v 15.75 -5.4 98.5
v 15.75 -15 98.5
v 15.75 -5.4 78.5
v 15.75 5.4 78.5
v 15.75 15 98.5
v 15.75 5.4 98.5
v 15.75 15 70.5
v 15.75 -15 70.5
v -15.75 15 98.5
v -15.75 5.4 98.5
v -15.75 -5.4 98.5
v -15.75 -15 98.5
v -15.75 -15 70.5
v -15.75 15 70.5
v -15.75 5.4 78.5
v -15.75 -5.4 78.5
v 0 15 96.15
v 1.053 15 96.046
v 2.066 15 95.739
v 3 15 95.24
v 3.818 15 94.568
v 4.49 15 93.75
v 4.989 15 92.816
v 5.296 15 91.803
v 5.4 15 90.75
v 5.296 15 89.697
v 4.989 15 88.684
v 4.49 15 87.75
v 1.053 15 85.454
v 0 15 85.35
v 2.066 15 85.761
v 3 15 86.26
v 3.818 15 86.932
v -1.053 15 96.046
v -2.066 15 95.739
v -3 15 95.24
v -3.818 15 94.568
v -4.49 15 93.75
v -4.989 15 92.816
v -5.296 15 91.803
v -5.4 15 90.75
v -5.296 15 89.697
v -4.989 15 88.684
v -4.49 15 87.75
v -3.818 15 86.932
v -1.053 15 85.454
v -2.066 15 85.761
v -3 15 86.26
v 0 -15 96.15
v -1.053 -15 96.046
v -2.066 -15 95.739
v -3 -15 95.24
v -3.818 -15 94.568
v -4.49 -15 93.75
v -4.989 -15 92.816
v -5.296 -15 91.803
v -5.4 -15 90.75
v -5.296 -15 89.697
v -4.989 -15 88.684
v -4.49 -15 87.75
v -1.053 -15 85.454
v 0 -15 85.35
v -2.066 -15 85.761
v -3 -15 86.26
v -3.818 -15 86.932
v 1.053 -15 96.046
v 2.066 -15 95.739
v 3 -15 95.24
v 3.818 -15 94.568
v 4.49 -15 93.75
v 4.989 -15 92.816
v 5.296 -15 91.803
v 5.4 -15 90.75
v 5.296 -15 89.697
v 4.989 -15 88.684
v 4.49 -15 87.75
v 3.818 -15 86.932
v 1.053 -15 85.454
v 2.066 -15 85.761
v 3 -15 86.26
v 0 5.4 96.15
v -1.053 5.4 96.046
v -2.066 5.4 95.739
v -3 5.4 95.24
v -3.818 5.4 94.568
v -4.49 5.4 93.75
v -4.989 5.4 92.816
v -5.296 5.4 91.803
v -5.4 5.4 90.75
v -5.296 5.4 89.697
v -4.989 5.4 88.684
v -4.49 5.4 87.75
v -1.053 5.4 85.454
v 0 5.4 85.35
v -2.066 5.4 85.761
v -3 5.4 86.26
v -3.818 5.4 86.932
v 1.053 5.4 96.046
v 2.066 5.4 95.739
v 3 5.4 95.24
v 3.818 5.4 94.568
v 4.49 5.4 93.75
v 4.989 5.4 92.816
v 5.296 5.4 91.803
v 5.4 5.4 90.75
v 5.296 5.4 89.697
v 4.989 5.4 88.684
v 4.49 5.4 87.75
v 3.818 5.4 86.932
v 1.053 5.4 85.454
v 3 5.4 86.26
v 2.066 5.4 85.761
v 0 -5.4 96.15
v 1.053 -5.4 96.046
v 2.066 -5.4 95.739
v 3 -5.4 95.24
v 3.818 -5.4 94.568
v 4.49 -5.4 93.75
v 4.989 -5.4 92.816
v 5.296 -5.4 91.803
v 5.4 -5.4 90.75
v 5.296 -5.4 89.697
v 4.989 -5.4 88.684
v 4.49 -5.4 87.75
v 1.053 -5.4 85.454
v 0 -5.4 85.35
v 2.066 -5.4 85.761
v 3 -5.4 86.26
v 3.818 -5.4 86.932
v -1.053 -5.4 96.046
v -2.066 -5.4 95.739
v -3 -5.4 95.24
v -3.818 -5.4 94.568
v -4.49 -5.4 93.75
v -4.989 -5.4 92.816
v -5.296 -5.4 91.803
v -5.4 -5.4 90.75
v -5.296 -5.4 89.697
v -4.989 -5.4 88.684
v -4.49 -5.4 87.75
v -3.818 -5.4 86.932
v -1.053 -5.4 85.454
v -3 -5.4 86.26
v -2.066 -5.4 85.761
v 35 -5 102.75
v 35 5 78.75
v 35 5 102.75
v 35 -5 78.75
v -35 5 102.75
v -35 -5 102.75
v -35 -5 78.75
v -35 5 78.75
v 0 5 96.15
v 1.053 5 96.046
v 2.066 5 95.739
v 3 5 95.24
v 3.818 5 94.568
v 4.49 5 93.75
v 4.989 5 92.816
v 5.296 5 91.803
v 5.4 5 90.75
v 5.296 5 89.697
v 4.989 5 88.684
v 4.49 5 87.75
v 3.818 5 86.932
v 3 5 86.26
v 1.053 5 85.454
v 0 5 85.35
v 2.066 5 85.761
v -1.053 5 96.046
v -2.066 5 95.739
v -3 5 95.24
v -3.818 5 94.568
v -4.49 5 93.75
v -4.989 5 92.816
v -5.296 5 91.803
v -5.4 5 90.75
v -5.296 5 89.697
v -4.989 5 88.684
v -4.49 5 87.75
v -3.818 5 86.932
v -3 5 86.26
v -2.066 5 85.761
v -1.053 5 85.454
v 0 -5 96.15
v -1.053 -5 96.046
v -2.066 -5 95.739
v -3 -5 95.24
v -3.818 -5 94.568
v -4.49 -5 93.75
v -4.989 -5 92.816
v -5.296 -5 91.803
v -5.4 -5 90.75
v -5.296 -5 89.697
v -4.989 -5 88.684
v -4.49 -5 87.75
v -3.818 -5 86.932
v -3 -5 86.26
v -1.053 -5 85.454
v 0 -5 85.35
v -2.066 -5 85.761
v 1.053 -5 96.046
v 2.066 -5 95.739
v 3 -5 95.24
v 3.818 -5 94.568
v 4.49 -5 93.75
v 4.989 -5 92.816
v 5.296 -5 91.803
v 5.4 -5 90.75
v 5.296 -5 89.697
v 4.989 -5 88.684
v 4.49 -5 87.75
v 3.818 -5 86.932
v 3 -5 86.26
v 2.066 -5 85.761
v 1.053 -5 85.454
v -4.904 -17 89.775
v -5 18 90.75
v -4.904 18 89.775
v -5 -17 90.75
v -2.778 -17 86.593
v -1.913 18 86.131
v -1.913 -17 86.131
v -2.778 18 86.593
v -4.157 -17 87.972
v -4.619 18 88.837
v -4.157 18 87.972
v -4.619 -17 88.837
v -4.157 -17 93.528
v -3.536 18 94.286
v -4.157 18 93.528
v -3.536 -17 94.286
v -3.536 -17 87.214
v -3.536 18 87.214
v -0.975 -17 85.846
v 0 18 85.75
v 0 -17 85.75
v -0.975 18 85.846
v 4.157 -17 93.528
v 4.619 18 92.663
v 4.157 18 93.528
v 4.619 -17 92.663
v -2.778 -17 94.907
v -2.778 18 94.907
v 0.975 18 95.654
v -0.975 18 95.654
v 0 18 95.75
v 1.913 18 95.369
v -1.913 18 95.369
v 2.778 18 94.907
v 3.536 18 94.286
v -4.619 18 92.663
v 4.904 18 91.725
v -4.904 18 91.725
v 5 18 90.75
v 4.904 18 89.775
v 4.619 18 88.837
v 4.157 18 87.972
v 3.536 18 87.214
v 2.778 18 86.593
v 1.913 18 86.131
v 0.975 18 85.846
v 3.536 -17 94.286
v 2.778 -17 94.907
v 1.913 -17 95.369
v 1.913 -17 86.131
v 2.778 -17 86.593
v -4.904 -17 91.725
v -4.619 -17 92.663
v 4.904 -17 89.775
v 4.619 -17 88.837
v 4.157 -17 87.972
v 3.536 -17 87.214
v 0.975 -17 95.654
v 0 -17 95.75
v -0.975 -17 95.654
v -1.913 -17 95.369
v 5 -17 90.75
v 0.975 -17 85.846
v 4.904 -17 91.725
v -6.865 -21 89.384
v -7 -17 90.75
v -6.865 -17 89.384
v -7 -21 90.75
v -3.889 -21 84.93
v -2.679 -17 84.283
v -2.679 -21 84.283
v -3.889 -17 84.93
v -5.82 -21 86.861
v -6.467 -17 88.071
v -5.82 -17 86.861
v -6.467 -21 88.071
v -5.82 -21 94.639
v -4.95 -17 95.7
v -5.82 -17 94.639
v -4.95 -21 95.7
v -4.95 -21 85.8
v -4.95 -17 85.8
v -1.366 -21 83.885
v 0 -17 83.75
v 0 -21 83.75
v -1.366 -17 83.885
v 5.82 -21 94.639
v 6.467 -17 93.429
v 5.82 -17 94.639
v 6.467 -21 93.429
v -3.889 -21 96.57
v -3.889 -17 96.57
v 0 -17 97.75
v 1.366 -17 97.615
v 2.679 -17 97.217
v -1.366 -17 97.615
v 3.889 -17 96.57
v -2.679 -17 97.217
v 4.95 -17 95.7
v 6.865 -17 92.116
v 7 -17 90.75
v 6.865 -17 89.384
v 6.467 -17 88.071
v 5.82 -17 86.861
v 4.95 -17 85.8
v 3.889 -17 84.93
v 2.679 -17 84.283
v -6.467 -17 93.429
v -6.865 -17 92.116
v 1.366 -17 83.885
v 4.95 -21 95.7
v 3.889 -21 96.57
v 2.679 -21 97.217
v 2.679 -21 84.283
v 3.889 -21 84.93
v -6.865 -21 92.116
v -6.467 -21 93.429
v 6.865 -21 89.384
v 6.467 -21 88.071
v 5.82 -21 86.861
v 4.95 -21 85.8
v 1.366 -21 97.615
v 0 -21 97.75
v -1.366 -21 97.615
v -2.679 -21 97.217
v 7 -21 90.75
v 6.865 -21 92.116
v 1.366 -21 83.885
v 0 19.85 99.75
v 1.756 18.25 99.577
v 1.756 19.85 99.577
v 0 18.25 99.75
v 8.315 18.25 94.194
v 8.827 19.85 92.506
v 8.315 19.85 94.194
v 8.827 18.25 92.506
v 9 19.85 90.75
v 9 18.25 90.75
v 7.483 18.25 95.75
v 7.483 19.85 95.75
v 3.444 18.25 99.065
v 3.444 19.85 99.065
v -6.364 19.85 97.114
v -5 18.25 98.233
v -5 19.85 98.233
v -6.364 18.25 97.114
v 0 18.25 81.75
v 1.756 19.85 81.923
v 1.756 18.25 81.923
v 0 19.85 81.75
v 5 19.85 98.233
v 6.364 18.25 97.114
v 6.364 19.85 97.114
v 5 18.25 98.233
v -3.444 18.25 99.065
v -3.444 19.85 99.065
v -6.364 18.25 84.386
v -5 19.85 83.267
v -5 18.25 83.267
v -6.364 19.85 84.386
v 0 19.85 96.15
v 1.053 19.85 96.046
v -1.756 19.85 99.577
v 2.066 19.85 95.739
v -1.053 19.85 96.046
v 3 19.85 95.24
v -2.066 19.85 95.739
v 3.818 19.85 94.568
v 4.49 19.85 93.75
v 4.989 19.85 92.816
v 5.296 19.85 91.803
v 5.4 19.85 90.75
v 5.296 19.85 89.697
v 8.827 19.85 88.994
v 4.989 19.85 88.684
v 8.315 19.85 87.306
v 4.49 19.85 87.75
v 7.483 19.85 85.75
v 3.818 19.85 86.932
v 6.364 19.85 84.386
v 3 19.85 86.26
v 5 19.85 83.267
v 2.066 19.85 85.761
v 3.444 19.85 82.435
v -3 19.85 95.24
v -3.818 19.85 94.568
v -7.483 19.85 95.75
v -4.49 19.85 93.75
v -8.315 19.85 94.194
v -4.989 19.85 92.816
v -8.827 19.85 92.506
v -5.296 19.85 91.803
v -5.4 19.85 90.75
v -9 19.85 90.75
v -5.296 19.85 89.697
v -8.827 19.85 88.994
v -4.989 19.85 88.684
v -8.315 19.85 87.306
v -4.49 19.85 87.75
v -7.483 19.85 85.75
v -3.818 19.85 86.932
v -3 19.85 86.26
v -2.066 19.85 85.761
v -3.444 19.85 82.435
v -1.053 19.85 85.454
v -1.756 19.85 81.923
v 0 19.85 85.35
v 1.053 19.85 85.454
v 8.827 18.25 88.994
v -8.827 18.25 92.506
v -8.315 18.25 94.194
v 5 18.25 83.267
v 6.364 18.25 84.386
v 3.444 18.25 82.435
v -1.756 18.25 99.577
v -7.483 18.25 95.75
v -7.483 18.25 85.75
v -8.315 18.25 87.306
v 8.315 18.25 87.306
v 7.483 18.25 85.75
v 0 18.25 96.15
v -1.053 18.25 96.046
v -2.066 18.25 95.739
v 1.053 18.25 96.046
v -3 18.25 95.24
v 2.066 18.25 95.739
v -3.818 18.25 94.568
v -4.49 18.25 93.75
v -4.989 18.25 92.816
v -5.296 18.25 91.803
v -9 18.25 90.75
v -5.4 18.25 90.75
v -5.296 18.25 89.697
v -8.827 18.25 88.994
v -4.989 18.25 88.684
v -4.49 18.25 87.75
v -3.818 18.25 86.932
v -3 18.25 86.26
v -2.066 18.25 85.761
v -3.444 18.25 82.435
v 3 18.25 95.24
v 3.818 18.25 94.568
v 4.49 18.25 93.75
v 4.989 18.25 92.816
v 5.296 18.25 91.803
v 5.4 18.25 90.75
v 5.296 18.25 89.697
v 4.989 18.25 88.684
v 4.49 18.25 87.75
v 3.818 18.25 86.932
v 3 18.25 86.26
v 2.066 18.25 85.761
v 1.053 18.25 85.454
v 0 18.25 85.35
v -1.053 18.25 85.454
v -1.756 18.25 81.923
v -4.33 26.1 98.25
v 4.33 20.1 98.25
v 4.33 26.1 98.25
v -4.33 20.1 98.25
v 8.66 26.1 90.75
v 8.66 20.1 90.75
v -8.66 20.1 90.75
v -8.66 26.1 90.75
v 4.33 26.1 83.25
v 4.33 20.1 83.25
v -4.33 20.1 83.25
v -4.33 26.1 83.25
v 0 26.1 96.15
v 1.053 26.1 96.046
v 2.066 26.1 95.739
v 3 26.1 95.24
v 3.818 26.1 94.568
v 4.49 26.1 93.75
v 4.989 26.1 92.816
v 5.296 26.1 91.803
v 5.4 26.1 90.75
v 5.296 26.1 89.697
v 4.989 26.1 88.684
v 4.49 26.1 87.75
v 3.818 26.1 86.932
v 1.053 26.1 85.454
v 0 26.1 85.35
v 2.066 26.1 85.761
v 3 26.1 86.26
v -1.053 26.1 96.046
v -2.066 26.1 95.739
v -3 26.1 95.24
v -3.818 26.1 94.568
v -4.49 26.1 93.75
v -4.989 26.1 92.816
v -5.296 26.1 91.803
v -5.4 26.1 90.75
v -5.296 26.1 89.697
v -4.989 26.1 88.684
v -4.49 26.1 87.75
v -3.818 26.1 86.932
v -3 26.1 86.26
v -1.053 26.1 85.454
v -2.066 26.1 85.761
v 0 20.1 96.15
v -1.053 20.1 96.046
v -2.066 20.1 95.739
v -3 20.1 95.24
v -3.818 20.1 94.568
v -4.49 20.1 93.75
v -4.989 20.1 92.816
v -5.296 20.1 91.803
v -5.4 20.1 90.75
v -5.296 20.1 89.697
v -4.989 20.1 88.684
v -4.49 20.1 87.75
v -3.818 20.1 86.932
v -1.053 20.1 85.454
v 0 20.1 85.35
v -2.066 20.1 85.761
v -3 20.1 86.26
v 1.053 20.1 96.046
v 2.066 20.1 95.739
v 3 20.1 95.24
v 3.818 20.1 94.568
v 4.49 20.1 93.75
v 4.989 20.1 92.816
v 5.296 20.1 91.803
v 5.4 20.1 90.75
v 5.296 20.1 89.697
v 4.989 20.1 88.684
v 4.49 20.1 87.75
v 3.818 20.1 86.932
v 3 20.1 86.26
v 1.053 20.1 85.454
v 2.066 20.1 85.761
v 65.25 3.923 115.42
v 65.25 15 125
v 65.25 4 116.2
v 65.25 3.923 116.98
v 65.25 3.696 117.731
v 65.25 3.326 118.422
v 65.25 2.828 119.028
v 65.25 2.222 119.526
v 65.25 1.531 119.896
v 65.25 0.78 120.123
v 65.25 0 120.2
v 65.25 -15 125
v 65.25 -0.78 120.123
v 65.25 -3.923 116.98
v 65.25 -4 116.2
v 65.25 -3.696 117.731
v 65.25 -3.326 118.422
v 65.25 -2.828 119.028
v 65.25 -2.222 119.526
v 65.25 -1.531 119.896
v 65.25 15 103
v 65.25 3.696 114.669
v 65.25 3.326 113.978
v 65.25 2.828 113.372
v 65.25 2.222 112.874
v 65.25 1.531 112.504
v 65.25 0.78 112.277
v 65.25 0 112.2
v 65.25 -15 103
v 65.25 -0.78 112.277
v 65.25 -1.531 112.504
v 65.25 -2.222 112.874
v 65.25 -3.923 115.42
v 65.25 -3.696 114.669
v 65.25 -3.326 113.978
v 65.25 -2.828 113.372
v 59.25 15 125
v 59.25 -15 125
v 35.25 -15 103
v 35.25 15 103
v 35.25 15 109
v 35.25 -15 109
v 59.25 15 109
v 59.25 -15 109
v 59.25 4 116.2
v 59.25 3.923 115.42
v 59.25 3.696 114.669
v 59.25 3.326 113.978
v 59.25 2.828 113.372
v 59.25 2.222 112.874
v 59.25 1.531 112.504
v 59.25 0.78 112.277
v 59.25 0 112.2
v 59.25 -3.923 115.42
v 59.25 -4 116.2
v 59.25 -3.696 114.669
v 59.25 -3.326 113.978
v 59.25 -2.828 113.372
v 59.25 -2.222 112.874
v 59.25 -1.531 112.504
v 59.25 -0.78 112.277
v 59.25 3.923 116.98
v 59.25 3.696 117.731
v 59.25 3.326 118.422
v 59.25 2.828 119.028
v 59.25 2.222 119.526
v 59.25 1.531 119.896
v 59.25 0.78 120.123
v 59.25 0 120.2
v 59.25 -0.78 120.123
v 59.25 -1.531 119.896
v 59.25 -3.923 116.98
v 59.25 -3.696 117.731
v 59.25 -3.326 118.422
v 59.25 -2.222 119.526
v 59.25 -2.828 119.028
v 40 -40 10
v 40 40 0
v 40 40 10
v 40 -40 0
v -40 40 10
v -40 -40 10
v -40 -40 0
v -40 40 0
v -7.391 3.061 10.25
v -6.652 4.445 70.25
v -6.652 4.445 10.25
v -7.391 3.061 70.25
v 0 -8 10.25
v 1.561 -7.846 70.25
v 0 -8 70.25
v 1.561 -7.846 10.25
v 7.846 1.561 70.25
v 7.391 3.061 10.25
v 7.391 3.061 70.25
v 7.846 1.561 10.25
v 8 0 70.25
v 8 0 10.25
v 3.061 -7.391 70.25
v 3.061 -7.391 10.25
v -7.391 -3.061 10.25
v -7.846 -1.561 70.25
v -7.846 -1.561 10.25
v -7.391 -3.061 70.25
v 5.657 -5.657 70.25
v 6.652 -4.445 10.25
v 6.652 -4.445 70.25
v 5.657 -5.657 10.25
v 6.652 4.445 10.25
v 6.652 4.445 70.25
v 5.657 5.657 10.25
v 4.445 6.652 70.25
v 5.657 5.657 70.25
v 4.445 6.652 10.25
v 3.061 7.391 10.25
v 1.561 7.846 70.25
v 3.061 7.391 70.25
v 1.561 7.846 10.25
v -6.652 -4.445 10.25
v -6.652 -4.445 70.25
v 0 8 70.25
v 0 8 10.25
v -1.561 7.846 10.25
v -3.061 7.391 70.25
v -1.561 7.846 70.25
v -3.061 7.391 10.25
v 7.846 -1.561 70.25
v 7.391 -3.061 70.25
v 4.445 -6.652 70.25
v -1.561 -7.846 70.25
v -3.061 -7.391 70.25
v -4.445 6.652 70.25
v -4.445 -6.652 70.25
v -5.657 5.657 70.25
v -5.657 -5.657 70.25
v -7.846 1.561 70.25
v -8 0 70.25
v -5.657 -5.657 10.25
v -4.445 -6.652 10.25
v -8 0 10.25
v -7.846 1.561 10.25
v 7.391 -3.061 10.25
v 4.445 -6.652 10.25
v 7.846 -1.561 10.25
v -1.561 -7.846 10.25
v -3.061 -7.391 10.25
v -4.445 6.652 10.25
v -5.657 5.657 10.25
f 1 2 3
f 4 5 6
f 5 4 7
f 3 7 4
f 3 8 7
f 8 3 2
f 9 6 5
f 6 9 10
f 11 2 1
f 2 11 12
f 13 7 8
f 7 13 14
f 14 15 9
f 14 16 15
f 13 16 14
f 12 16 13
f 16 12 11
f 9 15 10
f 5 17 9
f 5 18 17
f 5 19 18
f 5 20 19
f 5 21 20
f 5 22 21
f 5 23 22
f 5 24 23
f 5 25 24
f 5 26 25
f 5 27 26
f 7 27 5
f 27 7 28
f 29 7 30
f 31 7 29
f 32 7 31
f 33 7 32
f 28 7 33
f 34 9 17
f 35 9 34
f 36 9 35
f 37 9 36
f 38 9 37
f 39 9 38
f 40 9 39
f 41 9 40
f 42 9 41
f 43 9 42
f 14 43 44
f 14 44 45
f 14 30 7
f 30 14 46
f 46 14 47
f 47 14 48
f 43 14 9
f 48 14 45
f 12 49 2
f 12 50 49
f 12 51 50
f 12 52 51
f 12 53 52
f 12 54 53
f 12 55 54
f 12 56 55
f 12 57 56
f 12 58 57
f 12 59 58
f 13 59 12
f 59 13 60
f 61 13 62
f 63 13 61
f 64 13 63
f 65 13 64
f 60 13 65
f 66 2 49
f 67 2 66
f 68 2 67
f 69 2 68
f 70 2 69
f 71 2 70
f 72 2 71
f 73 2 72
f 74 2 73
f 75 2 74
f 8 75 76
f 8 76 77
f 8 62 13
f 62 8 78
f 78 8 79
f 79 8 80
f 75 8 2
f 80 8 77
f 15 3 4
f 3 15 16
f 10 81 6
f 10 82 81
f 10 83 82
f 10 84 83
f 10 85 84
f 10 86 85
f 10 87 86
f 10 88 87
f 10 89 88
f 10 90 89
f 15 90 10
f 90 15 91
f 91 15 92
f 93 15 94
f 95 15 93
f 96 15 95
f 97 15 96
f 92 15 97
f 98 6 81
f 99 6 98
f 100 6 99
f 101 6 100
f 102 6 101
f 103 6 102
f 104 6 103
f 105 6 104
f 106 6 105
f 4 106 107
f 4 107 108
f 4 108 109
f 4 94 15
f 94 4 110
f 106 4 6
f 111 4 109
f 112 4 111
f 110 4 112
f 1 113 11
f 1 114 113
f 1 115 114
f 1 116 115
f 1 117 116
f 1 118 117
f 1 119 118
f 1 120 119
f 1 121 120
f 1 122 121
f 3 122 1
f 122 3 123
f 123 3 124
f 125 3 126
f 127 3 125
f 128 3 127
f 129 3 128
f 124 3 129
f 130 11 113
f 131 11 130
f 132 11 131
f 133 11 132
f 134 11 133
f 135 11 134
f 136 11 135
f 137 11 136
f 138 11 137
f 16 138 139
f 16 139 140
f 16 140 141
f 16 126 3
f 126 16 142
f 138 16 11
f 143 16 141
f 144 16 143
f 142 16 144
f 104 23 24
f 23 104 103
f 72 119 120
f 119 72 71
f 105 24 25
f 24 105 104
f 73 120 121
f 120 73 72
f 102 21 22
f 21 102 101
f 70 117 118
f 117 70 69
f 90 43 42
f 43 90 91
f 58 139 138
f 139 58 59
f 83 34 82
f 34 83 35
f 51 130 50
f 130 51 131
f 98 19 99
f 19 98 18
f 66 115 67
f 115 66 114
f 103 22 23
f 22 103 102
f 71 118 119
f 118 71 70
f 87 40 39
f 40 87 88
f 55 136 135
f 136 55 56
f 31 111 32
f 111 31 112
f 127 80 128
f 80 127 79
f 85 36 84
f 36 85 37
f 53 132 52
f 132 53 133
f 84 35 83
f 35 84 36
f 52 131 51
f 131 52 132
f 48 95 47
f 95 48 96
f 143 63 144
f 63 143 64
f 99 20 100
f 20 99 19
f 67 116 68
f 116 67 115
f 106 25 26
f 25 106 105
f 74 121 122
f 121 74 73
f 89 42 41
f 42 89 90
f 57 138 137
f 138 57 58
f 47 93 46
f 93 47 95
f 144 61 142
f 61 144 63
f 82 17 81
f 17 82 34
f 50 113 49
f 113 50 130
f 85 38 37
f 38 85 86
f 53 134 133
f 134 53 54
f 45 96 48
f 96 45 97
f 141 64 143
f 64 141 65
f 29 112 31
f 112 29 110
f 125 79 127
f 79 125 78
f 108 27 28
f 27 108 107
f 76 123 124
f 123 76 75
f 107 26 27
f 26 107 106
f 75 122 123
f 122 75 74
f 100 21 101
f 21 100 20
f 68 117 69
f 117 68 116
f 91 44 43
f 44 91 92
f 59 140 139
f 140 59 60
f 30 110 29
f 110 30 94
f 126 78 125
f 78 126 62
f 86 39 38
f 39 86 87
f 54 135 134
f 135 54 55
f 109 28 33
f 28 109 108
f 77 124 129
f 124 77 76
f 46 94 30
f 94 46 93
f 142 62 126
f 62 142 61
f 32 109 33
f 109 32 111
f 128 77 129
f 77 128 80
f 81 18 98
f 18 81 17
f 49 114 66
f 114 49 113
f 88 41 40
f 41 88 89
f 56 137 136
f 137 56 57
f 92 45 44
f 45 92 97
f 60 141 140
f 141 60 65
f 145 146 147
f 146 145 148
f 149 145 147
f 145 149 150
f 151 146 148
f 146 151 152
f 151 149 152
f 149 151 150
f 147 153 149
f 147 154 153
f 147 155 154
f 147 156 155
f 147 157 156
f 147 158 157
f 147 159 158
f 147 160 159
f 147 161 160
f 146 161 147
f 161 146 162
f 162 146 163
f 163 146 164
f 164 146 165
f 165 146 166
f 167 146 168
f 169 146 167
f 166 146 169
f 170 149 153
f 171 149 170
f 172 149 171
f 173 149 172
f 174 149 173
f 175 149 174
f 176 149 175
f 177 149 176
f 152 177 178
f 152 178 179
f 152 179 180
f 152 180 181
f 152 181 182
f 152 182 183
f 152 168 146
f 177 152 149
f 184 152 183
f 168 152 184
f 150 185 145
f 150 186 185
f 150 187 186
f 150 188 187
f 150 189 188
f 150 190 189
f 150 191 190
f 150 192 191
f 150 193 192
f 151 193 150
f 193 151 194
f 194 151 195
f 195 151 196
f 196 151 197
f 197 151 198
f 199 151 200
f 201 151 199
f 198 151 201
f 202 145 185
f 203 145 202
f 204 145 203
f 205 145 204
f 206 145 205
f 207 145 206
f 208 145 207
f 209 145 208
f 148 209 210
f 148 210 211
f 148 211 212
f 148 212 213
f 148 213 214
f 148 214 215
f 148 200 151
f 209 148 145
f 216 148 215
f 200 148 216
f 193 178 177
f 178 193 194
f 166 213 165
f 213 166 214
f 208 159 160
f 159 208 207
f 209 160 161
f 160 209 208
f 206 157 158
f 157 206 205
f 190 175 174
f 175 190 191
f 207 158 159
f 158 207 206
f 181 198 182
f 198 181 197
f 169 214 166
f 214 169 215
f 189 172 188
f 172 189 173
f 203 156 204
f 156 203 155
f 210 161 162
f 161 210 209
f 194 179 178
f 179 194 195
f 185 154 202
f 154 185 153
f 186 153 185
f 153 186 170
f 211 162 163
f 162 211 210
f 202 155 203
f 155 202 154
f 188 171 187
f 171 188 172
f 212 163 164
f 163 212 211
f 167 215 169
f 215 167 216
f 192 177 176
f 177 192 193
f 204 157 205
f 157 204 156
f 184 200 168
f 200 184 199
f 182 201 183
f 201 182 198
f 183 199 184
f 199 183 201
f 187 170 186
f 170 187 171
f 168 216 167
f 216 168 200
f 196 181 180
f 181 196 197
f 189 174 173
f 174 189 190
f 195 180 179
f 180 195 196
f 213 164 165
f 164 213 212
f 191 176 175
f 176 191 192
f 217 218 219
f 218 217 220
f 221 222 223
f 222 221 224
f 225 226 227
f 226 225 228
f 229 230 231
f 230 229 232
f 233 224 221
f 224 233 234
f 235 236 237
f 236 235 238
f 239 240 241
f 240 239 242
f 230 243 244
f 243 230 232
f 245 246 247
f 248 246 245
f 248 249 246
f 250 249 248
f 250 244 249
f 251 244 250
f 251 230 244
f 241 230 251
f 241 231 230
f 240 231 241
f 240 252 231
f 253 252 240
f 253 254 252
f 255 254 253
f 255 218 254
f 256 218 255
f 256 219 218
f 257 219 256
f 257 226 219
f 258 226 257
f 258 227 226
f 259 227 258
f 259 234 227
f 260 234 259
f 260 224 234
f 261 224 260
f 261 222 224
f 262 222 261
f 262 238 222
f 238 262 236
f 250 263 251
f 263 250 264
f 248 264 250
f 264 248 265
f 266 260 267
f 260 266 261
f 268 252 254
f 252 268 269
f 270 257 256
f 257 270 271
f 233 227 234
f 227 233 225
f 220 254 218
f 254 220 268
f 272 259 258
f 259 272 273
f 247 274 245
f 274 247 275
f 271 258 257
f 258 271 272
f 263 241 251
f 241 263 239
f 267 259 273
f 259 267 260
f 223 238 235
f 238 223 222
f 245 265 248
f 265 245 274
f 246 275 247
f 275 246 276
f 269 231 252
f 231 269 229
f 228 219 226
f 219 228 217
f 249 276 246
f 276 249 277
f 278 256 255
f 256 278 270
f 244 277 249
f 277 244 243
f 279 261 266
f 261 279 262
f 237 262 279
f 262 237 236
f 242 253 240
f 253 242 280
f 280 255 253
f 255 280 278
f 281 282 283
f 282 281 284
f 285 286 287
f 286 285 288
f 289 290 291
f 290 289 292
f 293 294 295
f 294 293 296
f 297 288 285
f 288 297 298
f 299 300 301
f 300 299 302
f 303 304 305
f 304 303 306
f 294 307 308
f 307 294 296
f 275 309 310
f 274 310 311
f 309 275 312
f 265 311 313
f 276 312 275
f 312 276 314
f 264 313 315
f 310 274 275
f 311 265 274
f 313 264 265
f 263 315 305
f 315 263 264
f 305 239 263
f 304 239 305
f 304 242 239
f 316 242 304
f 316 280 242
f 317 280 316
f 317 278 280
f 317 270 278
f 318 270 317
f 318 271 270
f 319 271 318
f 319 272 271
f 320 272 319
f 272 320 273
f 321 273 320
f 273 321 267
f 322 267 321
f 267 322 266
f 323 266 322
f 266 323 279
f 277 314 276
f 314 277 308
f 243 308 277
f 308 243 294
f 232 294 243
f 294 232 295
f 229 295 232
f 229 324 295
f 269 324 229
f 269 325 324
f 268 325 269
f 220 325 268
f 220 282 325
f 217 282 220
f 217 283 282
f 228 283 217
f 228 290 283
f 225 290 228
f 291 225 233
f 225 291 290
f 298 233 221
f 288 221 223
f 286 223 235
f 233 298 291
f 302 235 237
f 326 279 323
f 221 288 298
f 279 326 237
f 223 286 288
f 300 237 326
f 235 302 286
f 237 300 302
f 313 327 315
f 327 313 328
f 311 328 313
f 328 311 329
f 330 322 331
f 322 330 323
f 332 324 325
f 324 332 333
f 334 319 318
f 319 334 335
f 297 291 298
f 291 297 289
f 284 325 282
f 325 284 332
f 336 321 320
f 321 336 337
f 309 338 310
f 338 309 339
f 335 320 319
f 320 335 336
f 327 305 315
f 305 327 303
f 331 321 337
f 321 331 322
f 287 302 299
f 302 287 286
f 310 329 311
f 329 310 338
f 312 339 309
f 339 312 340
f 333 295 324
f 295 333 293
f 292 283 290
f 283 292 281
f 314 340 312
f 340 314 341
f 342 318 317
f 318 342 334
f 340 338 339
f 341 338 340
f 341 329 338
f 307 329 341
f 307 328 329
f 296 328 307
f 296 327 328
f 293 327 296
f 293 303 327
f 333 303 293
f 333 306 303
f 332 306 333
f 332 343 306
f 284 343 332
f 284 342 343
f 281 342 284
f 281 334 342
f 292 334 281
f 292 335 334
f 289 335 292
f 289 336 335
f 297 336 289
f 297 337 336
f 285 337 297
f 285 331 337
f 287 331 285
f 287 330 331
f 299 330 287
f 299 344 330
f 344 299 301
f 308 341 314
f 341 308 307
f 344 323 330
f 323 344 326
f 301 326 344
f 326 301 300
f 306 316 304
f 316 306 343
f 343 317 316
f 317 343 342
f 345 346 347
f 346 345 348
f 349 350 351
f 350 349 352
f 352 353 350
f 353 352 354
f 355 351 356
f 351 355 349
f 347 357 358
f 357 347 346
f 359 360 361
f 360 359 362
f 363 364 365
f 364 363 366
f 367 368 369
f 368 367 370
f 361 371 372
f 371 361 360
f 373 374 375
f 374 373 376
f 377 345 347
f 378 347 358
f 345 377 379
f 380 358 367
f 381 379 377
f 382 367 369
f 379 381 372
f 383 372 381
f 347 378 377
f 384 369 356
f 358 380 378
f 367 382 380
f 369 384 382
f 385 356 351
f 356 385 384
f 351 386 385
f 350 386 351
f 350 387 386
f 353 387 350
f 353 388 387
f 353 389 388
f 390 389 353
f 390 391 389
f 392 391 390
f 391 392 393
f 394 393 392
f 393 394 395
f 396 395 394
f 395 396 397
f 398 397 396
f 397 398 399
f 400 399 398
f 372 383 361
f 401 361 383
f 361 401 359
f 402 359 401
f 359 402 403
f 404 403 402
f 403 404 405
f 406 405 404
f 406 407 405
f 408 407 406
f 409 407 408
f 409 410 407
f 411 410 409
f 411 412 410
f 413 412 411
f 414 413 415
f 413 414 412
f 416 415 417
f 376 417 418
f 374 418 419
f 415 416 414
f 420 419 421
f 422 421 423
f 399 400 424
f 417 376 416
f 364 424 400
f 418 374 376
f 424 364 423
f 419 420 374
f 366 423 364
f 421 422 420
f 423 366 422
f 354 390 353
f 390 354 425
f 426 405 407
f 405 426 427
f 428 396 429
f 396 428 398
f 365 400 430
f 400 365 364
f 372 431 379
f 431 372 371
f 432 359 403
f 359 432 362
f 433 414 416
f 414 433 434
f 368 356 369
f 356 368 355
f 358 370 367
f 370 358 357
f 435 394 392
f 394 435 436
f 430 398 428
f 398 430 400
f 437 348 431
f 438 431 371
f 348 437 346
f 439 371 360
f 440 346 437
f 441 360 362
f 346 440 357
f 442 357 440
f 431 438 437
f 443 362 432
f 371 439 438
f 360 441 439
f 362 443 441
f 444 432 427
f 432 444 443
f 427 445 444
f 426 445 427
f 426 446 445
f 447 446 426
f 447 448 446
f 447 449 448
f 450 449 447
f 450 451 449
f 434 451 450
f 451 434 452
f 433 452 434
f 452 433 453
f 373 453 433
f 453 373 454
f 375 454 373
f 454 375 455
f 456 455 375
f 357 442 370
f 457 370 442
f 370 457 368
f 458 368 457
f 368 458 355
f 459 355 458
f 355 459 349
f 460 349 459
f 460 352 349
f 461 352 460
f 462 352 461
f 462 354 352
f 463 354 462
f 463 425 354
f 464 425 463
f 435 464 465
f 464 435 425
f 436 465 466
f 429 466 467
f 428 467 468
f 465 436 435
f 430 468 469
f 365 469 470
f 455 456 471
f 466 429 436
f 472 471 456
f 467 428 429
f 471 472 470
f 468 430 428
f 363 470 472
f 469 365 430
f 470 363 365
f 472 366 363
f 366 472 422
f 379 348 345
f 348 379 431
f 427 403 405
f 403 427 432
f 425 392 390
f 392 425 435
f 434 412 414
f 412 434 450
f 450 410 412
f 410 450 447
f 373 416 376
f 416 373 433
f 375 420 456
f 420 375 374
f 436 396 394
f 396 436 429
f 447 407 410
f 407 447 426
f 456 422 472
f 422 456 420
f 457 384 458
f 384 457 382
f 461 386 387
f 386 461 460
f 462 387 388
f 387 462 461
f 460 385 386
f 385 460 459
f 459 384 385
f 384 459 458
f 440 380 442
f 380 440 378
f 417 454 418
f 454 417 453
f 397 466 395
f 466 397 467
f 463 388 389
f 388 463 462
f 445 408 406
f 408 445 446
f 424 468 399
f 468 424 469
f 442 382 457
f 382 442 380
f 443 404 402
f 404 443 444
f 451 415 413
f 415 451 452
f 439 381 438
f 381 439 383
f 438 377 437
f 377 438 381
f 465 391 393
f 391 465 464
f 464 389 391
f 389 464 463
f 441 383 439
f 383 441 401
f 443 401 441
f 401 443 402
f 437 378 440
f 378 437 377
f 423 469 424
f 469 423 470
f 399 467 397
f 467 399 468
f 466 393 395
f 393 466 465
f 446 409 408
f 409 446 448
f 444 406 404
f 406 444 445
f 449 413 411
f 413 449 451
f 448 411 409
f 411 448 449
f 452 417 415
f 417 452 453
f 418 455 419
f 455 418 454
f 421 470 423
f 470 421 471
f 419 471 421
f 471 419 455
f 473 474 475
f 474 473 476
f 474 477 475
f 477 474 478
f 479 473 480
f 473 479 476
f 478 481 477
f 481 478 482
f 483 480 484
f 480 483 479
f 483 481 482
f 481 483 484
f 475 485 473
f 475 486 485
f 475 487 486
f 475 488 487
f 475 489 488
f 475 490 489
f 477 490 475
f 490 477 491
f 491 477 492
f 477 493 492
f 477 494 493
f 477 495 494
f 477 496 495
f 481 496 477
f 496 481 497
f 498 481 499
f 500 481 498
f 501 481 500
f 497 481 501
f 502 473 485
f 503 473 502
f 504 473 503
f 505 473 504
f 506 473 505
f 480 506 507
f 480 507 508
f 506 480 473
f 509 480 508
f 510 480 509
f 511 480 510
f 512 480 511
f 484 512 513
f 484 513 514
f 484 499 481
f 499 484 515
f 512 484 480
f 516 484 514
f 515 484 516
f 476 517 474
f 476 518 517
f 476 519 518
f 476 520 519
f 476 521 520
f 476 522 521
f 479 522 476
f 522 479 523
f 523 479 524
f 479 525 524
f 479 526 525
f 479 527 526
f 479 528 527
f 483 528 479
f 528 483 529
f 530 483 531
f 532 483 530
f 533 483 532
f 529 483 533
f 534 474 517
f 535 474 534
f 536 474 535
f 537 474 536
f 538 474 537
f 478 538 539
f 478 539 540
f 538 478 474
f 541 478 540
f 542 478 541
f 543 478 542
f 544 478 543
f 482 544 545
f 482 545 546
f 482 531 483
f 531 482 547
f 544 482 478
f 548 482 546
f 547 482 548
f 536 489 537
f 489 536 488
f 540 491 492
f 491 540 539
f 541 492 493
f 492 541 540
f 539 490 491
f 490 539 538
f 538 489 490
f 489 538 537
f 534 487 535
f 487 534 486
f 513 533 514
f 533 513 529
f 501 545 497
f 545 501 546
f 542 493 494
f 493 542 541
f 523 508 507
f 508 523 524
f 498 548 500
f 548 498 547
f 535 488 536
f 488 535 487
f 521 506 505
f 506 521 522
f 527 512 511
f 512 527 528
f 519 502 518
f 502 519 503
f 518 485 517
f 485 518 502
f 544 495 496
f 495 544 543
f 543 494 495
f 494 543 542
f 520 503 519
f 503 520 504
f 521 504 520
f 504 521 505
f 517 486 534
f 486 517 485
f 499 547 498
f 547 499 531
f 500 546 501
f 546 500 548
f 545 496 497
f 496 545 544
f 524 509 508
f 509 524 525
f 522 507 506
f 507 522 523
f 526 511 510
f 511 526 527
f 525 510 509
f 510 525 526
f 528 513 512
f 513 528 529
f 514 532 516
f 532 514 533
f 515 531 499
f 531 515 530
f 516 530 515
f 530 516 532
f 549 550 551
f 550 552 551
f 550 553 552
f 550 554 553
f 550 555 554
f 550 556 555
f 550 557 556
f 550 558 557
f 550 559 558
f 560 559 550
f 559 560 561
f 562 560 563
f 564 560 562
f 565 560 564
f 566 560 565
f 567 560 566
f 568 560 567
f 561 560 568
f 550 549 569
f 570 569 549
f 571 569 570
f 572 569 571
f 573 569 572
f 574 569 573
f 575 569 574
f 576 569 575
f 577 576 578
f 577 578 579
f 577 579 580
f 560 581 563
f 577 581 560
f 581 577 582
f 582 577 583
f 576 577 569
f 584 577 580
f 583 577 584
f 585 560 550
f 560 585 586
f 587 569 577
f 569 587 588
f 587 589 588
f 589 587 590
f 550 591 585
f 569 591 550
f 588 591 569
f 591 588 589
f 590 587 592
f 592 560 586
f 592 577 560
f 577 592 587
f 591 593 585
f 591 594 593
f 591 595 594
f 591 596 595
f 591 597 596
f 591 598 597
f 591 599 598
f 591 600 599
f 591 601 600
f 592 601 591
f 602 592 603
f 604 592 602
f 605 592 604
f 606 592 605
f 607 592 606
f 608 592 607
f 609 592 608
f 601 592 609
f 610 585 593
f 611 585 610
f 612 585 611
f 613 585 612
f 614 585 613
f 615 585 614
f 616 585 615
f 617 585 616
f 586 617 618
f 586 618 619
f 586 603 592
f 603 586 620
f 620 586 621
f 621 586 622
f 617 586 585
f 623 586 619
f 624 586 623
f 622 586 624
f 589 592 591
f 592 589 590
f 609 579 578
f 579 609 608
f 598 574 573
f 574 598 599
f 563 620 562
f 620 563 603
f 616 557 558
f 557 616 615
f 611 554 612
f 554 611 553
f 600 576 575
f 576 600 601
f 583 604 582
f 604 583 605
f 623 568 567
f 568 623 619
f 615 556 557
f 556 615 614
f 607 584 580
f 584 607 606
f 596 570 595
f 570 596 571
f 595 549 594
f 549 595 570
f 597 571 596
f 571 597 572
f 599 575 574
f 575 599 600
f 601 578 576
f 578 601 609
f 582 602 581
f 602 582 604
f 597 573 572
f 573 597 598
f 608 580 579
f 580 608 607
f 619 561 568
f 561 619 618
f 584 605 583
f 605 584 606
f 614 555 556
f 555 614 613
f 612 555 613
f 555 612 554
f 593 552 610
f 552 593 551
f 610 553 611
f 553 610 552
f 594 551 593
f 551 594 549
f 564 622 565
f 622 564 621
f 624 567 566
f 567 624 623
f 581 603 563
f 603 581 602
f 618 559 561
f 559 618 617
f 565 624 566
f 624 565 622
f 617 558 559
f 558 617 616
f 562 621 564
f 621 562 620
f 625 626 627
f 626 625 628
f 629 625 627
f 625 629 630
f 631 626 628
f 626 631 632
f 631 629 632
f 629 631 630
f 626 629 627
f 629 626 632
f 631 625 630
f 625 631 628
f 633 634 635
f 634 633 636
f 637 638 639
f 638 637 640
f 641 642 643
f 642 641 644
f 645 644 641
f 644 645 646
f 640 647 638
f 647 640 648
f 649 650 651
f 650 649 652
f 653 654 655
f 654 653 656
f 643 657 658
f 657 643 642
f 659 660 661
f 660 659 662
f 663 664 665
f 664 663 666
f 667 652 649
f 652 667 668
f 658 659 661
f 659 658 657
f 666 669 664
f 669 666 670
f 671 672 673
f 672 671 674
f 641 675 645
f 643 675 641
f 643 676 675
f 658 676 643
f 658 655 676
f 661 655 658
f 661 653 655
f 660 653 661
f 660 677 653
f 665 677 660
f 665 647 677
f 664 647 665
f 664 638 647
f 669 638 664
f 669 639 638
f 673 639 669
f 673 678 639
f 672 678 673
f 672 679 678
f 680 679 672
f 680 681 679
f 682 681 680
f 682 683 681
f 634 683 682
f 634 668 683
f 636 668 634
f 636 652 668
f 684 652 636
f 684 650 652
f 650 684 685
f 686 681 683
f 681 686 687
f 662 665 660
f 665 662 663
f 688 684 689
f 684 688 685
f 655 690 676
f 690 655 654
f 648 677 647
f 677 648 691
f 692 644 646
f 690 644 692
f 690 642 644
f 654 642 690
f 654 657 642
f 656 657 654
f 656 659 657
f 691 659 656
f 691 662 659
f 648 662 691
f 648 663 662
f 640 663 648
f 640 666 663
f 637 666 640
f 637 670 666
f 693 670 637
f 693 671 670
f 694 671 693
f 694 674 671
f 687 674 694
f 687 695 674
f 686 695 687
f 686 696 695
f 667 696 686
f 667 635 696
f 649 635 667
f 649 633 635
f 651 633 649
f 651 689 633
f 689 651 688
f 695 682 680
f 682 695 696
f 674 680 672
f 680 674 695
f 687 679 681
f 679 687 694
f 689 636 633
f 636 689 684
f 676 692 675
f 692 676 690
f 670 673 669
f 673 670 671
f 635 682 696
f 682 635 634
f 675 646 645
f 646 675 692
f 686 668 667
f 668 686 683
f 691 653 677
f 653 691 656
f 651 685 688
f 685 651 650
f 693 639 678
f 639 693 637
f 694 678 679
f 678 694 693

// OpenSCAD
$fn = 32;

// ------------------------------------------------------------------------
// Lamp arm: column d16 x 60 mm, arm 70 mm
// Every part is its own module, assembly() places every instance.
// ------------------------------------------------------------------------

// --- part 1 ---
module lamp_base() {
  difference() {
    translate([-40, -40, 0]) cube([80, 80, 10]);
  }
}

// --- part 2 ---
module lamp_column() {
  cylinder(h = 60, d = 16);
}

// --- part 3 ---
module head_fork() {
  difference() {
    translate([-15.75, -15, 0]) cube([31.5, 30, 28]);
    translate([-16.75, -5.4, 8]) cube([33.5, 10.8, 21]);
    translate([0, 0, 20.25]) rotate([90, 0, 0]) cylinder(h = 32, d = 10.8, center = true);
  }
}

// --- part 4 ---
module lamp_arm() {
  difference() {
    translate([-35, -5, 0]) cube([70, 10, 24]);
    translate([0, 0, 12]) rotate([90, 0, 0]) cylinder(h = 12, d = 10.8, center = true);
  }
}

// --- part 5 ---
module arm_pin() {
  rotate([0, 90, 0]) cylinder(h = 36, d = 10, center = true);
  translate([-21, 0, 0]) rotate([0, 90, 0]) cylinder(h = 4, d = 14);
}

// --- part 6 ---
module arm_washer() {
  difference() {
      translate([0, 0, 0]) cylinder(h = 1.6, d = 18);
      translate([0, 0, -1]) cylinder(h = 3.6, d = 10.8);
    }
}

// --- part 7 ---
module arm_nut() {
  difference() {
    linear_extrude(height = 6) polygon(points = [[8.66, 0], [4.33, 7.5], [-4.33, 7.5], [-8.66, 0], [-4.33, -7.5], [4.33, -7.5]]);
    translate([0, 0, -1]) cylinder(h = 8, d = 10.8);
  }
}

// --- part 8 ---
module shade_bracket() {
  difference() {
    translate([-15, -15, 0]) cube([30, 30, 22]);
    translate([-16, -16, 6]) cube([25, 32, 17]);
    translate([12, 0, 13.2]) rotate([0, 90, 0]) cylinder(h = 8, d = 8, center = true);
  }
}

// --- assembly ---
module assembly() {
  color([0.80, 0.24, 0.20]) translate([0, 0, 0]) rotate([0, 0, 0]) lamp_base();
  color([0.20, 0.45, 0.75]) translate([0, 0, 10.25]) rotate([0, 0, 0]) lamp_column();
  color([0.25, 0.62, 0.32]) translate([0, 0, 70.5]) rotate([0, 0, 0]) head_fork();
  color([0.92, 0.70, 0.18]) translate([0, 0, 78.75]) rotate([0, 0, 0]) lamp_arm();
  color([0.58, 0.35, 0.70]) translate([0, 0, 90.75]) rotate([0, 0, 90]) arm_pin();
  color([0.16, 0.66, 0.66]) translate([0, 19.85, 90.75]) rotate([90, 0, 0]) arm_washer();
  color([0.85, 0.48, 0.18]) translate([0, 26.1, 90.75]) rotate([90, 0, 0]) arm_nut();
  color([0.55, 0.60, 0.65]) translate([50.25, 0, 103]) rotate([0, 0, 0]) shade_bracket();
}

assembly();
